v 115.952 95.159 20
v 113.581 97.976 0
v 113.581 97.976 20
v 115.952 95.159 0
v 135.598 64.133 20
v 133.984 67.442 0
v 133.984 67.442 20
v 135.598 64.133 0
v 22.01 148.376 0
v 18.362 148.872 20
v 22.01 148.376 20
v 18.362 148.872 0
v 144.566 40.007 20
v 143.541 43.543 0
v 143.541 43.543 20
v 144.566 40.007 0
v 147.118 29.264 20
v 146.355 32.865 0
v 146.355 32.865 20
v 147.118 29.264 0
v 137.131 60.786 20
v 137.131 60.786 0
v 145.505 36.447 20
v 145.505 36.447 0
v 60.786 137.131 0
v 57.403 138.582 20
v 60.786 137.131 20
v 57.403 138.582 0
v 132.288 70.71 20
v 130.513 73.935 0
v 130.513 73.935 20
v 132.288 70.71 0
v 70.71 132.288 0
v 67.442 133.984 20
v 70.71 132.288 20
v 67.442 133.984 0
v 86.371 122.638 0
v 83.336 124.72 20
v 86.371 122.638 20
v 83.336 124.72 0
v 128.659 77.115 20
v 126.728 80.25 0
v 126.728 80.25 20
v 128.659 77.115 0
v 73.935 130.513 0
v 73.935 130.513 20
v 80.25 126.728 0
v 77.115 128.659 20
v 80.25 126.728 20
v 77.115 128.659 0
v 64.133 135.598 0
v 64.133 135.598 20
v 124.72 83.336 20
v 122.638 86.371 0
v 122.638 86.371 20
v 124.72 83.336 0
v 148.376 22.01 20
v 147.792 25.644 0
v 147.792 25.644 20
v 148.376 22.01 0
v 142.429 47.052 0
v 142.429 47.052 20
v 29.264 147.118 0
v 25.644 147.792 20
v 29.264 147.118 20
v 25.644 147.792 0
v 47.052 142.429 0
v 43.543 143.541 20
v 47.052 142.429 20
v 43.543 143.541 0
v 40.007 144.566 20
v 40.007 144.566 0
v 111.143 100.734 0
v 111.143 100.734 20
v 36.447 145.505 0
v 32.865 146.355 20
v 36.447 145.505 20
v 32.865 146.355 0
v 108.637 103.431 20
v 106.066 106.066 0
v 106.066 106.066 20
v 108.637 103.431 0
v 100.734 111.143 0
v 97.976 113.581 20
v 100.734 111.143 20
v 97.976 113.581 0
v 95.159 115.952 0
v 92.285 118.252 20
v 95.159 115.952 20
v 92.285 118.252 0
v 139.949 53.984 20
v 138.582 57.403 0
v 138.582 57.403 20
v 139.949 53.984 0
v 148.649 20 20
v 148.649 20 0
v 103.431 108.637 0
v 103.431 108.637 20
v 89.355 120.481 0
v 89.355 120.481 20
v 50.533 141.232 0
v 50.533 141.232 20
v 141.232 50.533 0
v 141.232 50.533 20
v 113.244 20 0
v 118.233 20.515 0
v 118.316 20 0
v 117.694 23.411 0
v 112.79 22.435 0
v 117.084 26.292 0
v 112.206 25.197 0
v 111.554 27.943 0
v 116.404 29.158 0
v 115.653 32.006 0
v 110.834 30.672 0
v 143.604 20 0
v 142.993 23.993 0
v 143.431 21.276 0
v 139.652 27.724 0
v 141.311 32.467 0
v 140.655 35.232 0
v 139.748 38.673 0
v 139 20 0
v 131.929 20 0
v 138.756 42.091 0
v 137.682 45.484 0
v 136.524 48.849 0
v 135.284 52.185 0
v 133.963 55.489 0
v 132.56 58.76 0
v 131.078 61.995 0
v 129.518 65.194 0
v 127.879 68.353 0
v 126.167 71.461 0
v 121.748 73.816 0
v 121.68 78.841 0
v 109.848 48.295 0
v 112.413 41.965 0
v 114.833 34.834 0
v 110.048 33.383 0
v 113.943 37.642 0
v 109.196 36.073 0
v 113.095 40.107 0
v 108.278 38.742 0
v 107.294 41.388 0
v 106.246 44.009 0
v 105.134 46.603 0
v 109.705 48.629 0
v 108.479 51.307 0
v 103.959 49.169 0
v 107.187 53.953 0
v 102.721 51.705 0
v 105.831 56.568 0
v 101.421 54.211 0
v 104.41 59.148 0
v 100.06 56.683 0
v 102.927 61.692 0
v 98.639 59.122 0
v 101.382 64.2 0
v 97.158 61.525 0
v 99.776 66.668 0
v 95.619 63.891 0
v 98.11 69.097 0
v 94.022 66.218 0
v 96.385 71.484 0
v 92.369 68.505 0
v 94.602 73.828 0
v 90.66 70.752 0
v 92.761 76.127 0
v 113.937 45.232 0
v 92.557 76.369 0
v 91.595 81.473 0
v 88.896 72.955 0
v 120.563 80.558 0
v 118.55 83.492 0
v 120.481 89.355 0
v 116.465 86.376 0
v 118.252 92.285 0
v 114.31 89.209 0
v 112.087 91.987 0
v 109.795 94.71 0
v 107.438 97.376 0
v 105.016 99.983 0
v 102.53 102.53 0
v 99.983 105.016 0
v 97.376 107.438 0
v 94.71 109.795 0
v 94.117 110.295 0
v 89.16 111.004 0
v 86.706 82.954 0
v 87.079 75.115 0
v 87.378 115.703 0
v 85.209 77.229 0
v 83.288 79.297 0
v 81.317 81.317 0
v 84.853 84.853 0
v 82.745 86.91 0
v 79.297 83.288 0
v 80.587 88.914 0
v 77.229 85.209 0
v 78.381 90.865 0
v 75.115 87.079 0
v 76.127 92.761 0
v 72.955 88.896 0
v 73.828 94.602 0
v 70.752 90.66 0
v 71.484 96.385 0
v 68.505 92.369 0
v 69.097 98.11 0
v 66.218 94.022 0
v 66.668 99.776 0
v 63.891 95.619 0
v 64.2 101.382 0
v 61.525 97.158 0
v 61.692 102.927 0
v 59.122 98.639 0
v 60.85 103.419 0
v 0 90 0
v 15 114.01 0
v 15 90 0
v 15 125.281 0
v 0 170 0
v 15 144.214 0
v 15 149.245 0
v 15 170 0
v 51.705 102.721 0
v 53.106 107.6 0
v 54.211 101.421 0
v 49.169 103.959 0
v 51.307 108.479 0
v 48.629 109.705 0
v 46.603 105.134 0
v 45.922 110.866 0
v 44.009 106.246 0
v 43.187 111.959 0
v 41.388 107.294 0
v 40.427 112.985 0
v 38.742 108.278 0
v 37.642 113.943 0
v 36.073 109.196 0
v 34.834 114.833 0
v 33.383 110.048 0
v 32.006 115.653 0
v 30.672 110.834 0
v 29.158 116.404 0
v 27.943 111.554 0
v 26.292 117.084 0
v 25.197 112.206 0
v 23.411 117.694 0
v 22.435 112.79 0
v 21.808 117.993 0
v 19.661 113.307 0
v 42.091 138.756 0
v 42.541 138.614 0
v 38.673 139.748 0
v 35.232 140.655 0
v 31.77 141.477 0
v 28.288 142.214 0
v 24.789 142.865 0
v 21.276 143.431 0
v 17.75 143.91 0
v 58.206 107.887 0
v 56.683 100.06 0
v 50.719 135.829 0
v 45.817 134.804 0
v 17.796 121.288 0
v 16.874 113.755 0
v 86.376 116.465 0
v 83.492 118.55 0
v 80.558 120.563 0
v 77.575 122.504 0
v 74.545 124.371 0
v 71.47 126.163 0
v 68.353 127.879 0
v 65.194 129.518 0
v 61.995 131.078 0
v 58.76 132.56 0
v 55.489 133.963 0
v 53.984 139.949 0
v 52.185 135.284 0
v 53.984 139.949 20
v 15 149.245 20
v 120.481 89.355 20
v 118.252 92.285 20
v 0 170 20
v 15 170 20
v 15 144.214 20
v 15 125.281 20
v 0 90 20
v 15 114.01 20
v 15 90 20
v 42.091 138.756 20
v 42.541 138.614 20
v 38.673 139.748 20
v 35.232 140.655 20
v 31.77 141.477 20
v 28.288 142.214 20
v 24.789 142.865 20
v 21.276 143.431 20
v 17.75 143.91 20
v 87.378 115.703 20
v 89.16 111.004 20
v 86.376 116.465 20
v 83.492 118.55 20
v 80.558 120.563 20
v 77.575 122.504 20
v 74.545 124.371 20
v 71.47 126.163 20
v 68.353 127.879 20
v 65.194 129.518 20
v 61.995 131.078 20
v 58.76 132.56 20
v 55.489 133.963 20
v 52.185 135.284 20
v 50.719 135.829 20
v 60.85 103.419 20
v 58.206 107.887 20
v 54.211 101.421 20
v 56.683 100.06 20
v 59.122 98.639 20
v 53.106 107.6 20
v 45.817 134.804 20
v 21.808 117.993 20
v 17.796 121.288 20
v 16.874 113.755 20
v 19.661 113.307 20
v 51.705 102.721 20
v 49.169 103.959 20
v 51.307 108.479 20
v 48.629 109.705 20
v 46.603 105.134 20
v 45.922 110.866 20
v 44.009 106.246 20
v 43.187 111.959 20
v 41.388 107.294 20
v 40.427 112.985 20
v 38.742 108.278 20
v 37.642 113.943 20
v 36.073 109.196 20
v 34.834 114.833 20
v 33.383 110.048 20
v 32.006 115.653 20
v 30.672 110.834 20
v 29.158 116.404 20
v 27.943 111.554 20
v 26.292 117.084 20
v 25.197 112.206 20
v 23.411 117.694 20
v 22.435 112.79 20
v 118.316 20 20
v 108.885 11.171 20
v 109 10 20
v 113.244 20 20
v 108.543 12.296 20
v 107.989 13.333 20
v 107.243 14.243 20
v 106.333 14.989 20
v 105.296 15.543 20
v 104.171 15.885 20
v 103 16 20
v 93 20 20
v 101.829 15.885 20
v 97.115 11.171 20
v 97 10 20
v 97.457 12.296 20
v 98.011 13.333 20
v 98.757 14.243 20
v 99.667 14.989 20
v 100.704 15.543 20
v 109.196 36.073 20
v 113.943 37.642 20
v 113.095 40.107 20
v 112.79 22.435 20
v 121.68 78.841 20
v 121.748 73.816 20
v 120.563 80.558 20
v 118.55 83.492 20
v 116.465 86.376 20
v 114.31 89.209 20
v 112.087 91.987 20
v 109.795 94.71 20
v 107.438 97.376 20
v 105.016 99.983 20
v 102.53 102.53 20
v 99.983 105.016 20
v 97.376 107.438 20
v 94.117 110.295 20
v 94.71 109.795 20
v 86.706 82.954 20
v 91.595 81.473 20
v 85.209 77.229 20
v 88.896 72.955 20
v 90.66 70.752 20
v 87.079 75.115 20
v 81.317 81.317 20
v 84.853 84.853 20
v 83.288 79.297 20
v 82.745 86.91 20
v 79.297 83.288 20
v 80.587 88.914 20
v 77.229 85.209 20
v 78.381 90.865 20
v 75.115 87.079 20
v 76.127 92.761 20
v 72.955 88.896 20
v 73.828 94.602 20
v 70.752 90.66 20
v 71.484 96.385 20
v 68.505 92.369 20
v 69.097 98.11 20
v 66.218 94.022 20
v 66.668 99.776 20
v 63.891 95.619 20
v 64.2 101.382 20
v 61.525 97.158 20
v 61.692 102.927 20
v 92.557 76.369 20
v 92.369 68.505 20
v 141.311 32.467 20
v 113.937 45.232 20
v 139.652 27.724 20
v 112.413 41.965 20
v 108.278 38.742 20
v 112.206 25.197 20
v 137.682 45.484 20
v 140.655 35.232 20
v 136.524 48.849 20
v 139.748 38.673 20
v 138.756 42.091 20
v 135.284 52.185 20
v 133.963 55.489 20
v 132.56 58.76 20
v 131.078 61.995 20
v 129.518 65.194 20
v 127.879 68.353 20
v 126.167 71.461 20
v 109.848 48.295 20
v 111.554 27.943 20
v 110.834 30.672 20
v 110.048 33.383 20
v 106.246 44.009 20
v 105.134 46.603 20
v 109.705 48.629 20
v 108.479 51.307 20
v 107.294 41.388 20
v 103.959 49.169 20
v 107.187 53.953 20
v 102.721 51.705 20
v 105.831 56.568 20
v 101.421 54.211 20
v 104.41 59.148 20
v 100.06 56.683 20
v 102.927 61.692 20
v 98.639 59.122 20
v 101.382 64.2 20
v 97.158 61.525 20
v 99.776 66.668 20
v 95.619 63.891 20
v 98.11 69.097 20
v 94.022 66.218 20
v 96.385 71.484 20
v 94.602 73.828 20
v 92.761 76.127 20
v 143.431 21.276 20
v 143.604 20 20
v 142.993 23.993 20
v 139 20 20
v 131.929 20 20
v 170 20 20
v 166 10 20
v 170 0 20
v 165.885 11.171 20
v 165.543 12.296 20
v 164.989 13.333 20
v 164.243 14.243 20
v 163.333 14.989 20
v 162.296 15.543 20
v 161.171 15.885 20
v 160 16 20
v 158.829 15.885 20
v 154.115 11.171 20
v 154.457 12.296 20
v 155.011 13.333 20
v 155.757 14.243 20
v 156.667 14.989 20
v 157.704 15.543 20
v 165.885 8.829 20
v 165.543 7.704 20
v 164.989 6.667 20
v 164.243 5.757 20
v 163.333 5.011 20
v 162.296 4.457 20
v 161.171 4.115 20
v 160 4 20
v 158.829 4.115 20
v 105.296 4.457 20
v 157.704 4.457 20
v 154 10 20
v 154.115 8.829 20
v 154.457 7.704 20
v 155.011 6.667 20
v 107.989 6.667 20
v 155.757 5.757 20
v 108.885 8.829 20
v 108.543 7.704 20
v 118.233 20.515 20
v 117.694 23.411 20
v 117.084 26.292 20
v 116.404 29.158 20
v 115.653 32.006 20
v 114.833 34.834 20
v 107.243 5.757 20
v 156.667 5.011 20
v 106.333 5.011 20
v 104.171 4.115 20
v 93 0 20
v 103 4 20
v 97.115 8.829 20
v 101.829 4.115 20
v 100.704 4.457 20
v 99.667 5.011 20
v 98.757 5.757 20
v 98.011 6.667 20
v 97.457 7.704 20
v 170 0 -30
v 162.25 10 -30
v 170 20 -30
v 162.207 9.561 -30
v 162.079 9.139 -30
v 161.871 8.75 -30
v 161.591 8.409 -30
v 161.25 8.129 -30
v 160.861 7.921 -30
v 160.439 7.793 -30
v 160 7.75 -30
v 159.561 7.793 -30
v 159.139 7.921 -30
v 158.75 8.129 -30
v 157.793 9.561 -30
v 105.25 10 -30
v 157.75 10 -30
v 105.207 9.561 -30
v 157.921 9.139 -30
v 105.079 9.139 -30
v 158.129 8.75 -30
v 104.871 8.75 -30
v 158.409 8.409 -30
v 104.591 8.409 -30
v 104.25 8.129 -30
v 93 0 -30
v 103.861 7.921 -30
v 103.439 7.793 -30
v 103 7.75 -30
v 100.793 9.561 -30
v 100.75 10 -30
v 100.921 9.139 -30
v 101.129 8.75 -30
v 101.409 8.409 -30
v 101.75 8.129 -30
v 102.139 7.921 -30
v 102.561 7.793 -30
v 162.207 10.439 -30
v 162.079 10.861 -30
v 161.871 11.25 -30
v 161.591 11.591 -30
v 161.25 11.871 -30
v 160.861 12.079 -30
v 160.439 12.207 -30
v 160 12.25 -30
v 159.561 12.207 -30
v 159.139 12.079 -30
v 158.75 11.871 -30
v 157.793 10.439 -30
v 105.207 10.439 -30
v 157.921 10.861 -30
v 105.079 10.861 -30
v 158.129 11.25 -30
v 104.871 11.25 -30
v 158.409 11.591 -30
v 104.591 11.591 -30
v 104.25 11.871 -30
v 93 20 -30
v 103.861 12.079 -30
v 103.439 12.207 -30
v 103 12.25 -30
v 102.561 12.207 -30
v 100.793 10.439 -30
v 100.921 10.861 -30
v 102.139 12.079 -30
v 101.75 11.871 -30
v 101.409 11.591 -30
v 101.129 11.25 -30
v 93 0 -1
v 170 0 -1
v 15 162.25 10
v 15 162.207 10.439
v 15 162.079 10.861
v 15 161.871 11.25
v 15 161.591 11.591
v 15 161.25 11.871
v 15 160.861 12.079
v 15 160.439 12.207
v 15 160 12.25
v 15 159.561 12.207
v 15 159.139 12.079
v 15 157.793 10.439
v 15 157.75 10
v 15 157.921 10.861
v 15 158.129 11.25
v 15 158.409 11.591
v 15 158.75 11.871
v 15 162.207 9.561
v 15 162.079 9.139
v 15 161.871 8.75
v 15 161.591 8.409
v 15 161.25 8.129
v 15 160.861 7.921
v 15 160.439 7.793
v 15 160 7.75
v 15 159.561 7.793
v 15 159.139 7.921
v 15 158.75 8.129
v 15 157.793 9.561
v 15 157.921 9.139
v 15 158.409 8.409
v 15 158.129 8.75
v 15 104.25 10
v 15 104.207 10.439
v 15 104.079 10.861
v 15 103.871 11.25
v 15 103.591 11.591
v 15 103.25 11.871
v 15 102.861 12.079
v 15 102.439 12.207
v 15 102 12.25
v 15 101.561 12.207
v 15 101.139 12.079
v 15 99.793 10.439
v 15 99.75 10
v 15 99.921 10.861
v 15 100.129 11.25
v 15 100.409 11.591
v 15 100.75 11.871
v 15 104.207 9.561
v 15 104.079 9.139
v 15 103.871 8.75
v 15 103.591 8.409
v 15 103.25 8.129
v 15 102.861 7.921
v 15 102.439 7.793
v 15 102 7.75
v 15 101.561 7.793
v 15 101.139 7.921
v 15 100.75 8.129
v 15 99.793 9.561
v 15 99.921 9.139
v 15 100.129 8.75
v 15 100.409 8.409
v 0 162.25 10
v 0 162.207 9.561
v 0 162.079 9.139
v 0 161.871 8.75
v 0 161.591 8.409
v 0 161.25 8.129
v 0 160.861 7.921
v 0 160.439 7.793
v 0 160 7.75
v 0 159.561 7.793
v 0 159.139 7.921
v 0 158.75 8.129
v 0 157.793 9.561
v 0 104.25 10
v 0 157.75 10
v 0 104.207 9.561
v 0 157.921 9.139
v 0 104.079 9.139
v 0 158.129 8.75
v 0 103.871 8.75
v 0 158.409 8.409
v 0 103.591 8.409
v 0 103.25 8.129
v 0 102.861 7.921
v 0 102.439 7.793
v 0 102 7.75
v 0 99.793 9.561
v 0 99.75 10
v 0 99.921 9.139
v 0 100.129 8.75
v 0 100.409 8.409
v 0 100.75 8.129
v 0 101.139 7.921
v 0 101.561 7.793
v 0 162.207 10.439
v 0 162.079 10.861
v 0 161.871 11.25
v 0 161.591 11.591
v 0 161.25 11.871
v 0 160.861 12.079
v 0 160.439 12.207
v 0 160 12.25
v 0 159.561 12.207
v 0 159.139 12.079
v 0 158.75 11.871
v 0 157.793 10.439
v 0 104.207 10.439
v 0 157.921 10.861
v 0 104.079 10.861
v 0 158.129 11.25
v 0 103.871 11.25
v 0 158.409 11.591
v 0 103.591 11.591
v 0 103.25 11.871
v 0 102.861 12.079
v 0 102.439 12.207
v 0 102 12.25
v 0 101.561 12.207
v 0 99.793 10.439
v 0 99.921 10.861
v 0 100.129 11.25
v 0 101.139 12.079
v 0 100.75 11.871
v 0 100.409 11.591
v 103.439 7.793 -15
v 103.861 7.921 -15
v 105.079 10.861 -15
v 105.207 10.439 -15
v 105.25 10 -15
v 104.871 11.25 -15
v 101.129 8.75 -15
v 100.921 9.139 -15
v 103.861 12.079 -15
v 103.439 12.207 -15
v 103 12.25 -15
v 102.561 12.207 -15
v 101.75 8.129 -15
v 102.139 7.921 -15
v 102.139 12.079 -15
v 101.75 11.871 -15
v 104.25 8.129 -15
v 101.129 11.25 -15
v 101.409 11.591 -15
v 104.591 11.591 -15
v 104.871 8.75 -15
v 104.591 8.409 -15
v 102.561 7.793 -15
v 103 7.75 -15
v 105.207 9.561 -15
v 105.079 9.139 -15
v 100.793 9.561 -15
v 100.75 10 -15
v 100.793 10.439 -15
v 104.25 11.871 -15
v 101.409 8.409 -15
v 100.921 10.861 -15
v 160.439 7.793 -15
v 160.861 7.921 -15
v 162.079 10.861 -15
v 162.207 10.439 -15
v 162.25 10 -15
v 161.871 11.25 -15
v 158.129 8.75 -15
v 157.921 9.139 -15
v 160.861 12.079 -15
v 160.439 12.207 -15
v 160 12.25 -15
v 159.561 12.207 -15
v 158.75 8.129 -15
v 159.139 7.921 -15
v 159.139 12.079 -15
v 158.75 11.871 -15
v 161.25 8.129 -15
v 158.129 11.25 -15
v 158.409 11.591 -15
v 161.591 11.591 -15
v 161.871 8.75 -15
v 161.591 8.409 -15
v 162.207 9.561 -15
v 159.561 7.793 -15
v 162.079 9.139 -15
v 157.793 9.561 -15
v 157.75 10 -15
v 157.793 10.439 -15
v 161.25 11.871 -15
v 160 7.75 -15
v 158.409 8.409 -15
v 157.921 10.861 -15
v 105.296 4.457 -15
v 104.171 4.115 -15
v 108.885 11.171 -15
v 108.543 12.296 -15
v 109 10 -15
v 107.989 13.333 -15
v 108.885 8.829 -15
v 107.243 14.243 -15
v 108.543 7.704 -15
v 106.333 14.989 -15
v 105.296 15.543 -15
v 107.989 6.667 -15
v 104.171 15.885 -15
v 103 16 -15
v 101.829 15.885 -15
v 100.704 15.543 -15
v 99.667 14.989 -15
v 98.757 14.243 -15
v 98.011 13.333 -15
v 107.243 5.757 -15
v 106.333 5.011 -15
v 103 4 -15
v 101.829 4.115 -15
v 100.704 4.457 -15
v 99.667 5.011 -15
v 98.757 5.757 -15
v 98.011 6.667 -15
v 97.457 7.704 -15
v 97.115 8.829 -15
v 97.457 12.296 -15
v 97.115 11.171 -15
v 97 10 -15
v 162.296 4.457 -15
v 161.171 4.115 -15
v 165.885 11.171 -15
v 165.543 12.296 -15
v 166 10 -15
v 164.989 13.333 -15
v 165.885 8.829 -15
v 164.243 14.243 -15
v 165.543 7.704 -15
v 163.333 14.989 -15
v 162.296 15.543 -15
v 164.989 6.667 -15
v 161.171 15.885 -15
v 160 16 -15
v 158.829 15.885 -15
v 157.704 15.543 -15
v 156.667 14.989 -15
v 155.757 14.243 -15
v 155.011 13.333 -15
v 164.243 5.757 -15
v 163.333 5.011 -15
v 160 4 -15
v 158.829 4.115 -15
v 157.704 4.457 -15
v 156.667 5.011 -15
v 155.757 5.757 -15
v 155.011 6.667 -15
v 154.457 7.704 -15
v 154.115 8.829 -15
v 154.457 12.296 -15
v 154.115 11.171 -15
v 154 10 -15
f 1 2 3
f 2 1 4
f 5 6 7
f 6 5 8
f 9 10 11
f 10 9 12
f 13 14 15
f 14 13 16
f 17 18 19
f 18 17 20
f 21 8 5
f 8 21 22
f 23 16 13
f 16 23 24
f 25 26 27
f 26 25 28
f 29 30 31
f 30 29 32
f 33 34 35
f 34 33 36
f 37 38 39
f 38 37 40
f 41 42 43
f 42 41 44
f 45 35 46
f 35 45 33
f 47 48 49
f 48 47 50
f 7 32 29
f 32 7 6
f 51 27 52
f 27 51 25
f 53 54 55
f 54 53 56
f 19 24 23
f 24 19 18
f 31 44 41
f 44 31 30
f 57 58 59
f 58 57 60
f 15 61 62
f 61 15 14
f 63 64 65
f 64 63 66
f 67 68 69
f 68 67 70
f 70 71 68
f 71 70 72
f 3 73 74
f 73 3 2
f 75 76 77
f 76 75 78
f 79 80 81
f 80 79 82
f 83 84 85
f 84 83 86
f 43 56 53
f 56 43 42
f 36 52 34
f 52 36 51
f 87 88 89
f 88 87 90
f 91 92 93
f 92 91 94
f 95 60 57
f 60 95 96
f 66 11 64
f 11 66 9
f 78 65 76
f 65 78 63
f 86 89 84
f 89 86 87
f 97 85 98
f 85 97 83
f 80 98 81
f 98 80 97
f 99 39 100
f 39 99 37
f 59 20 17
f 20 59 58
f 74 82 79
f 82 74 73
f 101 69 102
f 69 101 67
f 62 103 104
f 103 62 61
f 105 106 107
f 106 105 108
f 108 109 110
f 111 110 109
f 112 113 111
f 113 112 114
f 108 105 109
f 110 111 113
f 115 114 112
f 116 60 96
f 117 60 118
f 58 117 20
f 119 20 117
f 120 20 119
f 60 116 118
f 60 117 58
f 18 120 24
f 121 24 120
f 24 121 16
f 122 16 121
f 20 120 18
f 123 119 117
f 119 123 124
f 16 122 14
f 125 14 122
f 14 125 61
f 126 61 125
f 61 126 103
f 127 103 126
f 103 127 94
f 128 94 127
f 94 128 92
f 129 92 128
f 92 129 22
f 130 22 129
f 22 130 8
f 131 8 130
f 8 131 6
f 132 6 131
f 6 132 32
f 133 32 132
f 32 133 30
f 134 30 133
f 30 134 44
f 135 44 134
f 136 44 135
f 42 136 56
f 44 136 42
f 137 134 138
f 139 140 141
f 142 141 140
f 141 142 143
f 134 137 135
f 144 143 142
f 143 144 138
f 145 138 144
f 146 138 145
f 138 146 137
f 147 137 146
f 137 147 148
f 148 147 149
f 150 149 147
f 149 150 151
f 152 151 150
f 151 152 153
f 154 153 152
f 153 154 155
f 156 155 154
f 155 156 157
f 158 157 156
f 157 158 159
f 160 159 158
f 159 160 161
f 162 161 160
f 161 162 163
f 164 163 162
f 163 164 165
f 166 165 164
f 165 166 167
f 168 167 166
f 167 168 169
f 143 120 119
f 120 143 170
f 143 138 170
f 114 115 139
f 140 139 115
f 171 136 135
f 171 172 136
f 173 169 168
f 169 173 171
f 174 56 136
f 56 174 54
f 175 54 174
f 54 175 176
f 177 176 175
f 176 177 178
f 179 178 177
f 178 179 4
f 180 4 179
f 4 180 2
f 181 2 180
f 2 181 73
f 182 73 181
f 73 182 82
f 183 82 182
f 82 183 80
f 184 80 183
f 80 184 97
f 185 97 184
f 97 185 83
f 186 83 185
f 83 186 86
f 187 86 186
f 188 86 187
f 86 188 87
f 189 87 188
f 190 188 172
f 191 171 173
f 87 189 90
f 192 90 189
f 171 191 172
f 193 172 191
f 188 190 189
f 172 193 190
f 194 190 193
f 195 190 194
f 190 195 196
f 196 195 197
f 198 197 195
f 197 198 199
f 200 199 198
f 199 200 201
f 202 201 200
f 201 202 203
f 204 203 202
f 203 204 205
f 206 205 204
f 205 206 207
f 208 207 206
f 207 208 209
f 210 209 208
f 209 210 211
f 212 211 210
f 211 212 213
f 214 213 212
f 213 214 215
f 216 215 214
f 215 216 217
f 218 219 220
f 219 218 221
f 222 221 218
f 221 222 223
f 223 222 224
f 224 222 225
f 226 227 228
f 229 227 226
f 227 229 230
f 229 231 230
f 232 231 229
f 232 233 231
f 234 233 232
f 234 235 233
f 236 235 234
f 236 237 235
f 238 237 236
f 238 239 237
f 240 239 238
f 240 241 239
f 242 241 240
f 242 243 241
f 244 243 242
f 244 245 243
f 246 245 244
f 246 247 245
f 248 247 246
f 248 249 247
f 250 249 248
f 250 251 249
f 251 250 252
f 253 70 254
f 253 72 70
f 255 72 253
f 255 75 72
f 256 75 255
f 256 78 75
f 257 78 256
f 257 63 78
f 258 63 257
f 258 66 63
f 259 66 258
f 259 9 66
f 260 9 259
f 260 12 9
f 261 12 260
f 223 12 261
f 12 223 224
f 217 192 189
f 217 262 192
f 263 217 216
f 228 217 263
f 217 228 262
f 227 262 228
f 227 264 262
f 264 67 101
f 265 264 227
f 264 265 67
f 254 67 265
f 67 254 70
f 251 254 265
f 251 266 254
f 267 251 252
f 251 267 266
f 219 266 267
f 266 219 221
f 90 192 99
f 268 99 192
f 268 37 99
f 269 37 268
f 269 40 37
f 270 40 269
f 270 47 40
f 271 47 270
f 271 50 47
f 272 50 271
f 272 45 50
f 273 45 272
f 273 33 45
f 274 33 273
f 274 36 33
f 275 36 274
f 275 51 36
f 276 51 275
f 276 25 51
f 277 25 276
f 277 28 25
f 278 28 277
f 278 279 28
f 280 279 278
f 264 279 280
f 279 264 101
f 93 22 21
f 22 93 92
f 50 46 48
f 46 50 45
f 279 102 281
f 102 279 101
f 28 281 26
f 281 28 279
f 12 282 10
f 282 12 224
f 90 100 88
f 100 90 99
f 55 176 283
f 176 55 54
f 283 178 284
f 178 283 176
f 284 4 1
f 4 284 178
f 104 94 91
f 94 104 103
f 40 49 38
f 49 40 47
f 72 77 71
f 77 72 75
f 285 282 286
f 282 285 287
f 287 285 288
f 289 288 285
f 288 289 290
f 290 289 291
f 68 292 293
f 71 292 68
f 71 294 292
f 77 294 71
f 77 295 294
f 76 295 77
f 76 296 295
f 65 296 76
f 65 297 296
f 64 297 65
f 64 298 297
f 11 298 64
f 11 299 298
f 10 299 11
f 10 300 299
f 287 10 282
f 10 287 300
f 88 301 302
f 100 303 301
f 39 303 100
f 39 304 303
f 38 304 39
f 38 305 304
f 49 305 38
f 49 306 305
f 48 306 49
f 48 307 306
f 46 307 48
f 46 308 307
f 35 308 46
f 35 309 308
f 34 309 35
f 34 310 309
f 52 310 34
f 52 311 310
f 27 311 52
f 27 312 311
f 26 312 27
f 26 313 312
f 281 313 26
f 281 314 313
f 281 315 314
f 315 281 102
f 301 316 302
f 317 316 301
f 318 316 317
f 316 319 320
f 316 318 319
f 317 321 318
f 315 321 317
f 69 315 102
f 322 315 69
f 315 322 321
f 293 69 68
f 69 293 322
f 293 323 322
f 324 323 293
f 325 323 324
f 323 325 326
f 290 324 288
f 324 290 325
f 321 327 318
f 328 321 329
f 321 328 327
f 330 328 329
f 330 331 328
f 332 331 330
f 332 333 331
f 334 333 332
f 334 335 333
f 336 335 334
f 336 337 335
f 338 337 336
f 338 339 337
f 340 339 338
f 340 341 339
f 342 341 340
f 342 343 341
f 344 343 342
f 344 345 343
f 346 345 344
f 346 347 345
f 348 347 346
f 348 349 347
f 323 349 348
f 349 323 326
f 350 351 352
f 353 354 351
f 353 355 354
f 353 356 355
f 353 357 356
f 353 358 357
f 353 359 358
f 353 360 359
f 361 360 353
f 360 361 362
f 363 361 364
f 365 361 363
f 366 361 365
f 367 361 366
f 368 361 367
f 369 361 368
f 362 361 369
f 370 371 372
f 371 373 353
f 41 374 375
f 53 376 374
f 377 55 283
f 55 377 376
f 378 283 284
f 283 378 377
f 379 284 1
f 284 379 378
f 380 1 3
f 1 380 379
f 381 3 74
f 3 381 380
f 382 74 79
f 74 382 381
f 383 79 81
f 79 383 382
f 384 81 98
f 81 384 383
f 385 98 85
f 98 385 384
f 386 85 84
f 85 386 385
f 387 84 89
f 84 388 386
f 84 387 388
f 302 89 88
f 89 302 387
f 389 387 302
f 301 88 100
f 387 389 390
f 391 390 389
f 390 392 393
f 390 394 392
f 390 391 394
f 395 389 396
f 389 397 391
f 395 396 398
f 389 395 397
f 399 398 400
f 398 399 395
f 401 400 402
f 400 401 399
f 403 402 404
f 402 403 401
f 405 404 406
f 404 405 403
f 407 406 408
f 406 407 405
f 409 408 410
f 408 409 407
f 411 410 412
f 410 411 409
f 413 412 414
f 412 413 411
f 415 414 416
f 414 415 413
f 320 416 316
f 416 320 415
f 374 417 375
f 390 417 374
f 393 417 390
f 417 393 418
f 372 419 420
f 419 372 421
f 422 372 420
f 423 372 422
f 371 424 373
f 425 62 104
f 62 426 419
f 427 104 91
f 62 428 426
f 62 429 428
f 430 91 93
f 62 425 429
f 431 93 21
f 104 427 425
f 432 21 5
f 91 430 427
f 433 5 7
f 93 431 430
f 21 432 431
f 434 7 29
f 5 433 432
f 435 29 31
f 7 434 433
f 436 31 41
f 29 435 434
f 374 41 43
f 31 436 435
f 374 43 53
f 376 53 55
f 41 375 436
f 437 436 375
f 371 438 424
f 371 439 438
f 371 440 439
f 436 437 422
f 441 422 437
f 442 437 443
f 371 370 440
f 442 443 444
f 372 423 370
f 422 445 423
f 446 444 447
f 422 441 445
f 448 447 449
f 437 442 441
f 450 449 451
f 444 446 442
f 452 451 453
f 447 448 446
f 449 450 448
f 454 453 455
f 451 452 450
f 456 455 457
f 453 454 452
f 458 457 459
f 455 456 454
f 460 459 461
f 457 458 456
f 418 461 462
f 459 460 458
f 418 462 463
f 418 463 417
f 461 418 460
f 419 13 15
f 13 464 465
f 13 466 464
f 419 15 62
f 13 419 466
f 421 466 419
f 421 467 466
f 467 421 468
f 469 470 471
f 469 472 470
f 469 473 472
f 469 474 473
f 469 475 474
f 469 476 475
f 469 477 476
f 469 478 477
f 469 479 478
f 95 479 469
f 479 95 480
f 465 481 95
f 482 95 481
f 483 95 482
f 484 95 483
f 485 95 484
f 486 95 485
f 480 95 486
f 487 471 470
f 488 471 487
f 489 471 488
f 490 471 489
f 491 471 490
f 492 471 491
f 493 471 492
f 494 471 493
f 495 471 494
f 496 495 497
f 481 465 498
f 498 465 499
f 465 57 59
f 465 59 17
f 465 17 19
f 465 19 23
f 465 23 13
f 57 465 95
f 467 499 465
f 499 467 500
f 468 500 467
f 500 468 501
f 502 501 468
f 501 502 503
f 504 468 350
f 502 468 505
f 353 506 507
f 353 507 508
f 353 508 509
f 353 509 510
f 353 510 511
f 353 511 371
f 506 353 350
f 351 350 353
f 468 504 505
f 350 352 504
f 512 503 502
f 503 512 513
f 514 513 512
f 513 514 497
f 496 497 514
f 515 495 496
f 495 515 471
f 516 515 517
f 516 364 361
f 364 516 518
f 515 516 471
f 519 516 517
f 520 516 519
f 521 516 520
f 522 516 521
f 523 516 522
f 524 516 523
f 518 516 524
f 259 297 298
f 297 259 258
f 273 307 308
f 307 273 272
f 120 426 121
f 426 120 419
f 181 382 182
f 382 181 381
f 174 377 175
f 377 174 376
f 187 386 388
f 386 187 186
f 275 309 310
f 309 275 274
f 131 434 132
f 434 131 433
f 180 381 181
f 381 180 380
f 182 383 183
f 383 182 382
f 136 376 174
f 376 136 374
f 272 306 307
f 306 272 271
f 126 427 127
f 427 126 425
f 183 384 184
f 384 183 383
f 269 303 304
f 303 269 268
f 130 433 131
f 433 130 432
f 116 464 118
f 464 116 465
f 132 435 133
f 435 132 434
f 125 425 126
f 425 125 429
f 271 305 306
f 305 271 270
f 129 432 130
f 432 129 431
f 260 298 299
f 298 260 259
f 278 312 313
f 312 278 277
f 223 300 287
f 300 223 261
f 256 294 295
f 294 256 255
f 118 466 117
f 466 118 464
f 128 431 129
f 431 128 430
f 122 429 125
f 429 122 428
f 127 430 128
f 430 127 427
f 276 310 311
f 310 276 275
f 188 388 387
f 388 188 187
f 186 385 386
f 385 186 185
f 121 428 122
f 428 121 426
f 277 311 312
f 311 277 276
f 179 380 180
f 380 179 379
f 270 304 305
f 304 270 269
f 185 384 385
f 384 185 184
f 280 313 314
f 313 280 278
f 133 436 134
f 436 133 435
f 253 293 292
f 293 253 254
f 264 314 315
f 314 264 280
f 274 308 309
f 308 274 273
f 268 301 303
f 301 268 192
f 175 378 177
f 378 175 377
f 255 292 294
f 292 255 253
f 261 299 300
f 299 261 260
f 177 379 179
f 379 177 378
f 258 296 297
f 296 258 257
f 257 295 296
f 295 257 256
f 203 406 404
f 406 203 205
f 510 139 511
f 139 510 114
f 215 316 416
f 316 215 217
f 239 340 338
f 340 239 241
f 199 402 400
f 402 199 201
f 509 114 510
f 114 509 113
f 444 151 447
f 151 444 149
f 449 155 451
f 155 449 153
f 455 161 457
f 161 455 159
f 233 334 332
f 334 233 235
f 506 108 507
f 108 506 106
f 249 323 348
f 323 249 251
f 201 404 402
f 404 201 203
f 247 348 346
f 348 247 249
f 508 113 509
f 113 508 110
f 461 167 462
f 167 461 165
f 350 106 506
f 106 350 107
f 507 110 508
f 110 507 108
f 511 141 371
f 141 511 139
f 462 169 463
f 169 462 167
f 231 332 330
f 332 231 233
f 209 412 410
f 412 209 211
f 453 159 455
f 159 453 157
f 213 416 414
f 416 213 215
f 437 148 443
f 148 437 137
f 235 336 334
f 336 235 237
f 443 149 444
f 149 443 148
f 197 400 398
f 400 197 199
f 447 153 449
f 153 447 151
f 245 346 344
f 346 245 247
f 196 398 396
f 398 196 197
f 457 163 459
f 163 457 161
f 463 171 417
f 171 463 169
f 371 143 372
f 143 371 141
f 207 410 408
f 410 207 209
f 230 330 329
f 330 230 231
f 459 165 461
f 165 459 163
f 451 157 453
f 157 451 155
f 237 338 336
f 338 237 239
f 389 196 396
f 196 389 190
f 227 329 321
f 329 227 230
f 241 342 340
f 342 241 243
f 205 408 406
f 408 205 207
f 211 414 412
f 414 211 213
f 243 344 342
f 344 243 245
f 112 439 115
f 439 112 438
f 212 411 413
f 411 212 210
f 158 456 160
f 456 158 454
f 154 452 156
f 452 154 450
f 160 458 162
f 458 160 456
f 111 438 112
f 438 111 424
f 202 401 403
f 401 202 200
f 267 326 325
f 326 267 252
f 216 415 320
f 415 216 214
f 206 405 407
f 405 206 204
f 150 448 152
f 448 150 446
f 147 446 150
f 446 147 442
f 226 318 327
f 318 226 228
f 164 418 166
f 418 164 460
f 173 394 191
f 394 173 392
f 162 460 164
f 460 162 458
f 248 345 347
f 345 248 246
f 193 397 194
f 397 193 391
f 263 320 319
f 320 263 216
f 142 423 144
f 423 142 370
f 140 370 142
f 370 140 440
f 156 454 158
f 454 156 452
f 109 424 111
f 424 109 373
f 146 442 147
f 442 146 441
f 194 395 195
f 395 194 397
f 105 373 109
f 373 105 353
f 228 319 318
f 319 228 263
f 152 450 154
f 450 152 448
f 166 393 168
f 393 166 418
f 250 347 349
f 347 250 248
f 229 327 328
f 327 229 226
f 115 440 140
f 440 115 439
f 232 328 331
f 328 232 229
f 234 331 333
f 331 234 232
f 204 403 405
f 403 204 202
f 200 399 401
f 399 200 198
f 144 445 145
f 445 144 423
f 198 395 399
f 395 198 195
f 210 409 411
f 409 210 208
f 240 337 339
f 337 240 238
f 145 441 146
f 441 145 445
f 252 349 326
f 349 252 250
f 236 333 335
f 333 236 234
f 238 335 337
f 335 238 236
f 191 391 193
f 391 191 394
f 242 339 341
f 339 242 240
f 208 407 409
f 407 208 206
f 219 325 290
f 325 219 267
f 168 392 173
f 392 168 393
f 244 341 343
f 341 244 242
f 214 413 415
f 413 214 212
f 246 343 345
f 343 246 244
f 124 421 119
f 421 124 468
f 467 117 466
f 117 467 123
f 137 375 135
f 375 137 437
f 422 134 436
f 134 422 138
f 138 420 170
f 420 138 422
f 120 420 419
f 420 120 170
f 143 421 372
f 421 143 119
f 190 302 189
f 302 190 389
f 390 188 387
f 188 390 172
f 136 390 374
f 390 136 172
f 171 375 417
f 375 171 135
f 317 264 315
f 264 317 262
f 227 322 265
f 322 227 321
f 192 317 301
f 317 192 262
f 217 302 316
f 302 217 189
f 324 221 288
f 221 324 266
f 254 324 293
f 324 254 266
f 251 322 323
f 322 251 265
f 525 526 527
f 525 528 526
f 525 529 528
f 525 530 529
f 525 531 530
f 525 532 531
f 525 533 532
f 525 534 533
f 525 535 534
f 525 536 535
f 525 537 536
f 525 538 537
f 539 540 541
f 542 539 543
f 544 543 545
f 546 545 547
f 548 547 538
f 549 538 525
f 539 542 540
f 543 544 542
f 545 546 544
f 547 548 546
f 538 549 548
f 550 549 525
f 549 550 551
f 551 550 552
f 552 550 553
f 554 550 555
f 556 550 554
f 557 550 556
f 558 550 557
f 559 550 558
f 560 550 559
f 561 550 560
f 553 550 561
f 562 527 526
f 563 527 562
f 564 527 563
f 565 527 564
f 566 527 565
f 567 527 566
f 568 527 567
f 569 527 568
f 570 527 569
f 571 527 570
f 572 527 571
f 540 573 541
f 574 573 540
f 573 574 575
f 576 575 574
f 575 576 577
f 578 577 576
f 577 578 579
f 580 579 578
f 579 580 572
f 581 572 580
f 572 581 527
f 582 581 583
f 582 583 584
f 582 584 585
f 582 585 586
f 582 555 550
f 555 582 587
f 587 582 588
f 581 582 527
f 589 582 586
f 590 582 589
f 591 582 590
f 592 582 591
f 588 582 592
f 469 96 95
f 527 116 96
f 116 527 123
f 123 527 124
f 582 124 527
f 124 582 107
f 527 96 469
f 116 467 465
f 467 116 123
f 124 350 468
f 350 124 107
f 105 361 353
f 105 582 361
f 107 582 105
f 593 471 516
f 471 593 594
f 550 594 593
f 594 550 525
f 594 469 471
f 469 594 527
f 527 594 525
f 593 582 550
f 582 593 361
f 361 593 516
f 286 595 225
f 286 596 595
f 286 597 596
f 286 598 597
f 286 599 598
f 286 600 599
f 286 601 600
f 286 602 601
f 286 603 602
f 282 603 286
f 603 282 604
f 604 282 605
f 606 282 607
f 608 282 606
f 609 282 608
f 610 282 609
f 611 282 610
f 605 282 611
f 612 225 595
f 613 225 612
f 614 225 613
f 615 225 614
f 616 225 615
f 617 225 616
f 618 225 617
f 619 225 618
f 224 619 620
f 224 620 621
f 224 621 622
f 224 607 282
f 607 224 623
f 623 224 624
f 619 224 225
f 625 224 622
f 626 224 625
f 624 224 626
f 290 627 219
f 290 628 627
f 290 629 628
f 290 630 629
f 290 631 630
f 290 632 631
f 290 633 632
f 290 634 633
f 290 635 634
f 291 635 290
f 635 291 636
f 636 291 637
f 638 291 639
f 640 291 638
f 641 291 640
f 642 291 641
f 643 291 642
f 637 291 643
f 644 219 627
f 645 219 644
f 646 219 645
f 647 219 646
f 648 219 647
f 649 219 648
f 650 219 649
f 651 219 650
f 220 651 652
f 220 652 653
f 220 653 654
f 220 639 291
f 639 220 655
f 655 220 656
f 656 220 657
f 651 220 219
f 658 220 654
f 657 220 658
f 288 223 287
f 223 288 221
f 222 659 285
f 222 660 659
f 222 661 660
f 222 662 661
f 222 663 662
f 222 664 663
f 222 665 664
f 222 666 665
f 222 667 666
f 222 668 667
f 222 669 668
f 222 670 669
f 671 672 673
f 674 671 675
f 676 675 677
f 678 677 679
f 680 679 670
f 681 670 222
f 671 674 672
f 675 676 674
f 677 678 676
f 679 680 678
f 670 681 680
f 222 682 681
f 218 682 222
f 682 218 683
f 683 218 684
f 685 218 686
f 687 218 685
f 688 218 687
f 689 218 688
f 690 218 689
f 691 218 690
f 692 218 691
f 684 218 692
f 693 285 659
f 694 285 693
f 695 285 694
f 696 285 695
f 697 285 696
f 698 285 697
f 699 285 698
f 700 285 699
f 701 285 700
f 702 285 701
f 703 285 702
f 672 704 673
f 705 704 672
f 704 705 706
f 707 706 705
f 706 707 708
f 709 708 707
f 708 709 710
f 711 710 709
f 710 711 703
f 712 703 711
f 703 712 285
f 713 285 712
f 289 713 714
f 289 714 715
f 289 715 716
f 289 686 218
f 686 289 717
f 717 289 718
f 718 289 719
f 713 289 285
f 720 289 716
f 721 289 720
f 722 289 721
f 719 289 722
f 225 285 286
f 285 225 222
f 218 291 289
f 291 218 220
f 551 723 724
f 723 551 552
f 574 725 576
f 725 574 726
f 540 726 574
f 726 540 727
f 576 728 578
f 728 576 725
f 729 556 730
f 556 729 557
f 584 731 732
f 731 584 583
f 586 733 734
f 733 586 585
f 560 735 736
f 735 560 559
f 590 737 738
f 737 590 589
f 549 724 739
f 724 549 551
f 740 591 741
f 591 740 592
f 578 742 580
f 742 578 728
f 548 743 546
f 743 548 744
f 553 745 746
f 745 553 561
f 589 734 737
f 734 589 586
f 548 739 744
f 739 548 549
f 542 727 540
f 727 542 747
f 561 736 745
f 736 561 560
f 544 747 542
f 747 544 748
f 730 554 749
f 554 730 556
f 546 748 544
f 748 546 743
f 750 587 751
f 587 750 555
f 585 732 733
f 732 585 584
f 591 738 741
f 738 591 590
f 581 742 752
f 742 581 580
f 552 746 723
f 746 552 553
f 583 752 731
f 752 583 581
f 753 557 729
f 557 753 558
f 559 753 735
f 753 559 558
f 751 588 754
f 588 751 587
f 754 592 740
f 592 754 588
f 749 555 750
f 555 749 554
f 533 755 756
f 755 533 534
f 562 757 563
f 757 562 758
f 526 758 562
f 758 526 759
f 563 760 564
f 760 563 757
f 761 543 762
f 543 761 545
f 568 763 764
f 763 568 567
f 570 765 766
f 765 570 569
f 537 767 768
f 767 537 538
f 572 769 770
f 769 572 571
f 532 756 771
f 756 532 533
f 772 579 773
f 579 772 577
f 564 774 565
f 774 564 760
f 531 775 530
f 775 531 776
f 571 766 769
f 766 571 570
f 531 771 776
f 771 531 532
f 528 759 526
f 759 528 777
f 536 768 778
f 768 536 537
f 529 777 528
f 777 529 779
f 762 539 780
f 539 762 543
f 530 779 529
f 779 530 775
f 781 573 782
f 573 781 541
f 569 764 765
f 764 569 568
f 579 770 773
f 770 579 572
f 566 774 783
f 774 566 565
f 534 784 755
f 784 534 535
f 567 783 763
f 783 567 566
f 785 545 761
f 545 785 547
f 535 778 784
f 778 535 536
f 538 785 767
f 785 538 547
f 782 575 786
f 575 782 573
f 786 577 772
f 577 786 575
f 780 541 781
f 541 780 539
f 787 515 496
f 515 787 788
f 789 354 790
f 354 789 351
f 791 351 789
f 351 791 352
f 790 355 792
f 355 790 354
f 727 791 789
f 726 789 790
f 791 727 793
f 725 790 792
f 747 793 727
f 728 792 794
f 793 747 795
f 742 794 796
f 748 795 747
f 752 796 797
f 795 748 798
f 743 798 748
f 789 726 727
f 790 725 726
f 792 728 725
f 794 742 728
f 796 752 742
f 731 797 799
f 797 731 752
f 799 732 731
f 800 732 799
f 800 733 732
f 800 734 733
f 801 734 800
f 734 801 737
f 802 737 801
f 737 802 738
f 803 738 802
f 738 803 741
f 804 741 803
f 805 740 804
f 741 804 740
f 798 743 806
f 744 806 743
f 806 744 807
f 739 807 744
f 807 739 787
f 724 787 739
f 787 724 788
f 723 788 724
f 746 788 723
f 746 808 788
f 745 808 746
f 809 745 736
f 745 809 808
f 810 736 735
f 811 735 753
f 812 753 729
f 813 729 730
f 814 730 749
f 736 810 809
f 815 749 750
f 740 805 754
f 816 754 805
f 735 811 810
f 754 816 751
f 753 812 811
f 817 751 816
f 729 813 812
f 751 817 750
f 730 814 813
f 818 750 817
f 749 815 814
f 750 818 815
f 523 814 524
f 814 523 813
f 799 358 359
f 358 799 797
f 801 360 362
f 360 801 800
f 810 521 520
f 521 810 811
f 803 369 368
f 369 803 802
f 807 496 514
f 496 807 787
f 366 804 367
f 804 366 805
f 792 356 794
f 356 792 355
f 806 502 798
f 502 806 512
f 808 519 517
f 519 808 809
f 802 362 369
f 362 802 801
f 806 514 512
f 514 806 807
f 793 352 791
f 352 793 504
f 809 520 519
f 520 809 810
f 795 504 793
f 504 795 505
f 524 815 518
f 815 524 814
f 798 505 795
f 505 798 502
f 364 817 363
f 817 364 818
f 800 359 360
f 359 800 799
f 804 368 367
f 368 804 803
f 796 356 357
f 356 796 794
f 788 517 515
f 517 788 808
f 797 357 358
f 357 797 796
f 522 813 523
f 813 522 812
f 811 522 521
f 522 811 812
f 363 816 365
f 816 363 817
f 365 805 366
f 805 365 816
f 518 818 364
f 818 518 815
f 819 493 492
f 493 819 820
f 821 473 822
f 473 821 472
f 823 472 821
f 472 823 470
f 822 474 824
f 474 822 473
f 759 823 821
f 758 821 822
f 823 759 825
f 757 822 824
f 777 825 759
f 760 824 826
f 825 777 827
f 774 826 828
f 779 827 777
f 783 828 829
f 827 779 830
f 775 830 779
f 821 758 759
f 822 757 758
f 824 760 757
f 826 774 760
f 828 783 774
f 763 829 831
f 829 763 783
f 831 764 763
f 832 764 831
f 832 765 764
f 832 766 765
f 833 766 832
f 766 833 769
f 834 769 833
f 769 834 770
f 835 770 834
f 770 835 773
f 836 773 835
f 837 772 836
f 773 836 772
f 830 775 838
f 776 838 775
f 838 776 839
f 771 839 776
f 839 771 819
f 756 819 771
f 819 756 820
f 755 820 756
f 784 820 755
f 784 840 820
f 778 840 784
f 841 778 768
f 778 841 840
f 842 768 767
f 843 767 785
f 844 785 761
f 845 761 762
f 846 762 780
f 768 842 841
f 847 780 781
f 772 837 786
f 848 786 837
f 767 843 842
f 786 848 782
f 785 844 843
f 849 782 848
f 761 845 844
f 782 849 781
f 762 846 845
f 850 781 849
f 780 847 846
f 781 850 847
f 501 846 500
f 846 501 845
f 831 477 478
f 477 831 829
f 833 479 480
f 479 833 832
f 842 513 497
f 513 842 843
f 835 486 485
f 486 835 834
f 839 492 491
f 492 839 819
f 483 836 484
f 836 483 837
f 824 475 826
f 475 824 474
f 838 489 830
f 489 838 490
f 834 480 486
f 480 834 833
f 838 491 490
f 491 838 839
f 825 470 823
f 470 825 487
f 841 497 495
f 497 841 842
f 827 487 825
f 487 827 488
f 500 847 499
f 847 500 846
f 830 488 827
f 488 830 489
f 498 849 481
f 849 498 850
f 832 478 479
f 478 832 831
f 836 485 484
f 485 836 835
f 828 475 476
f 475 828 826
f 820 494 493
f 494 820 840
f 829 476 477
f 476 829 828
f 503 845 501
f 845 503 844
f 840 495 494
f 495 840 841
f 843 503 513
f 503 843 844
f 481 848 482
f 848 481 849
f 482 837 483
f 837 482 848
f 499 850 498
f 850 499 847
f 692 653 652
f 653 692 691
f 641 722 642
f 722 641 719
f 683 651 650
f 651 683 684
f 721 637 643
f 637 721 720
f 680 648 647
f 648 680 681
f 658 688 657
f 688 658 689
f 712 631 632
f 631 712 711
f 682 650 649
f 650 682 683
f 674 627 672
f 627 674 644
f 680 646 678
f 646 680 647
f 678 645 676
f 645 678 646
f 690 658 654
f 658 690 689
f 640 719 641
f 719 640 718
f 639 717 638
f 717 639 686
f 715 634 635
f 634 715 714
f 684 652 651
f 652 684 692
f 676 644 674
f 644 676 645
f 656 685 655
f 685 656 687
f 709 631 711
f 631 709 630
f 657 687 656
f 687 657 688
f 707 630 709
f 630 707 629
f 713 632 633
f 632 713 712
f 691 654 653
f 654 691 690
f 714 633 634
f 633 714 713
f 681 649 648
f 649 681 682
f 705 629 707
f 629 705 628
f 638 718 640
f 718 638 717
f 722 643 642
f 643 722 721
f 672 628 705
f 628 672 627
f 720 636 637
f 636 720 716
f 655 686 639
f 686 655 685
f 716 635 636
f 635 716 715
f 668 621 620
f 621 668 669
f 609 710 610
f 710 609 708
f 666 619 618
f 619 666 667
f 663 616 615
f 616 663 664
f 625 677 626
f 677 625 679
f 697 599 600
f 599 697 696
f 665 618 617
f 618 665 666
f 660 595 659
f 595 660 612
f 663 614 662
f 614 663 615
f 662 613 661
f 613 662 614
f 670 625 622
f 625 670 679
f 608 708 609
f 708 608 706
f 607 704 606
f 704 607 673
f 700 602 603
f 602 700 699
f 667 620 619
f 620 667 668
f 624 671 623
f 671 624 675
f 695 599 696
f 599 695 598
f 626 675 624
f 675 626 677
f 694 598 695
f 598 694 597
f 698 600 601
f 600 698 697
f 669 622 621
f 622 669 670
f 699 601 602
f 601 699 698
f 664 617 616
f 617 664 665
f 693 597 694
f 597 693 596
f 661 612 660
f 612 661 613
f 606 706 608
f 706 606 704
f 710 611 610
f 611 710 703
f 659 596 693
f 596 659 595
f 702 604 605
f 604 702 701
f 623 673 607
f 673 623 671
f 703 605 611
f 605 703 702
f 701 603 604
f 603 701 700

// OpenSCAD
module Bracket90degreesSupport_backRight() {
    difference() {
        union() {
            difference() {
                cylinder(r=150, h=20, $fn=256);
                translate([0, 0, -1]) cylinder(r=145, h=22, $fn=256);
            }
            difference() {
                cylinder(r=120, h=20, $fn=256);
                translate([0, 0, -1]) cylinder(r=115, h=22, $fn=256);
            }
            for(i=[0:17]) {
                rotate([0, 0, i*20]) translate([119, 0, 0]) rotate([0, 0, 45]) cube([36, 5, 20]);
                rotate([0, 0, i*20]) translate([119, 0, 0]) rotate([0, 0, -45]) cube([36, 5, 20]);
            }
            translate([113, 0, -30]) cube([37, 20, 50]);
            translate([93, 0, -30]) cube([77, 20, 50]);
            translate([0, 90, 0]) cube([15, 80, 20]);
        }
        translate([-200, -200, -1]) cube([200, 400, 22]);
        translate([-1, -200, -1]) cube([200, 200, 22]);
        translate([103, 10, -32]) cylinder(d=4.5, h=50, $fn=32);
        translate([160, 10, -32]) cylinder(d=4.5, h=50, $fn=32);
        translate([103, 10, -15]) cylinder(d=12, h=50, $fn=32);
        translate([160, 10, -15]) cylinder(d=12, h=50, $fn=32);
        translate([-1, 102, 10]) rotate([0, 90, 0]) cylinder(d=4.5, h=30, $fn=32);
        translate([-1, 160, 10]) rotate([0, 90, 0]) cylinder(d=4.5, h=30, $fn=32);
    }
}

module Bracket90degreesSupport_frontRight() {
    difference() {
        union() {
            difference() {
                cylinder(r=150, h=20, $fn=256);
                translate([0, 0, -1]) cylinder(r=145, h=22, $fn=256);
            }
            difference() {
                cylinder(r=120, h=20, $fn=256);
                translate([0, 0, -1]) cylinder(r=115, h=22, $fn=256);
            }
            for(i=[0:17]) {
                rotate([0, 0, i*20]) translate([119, 0, 0]) rotate([0, 0, 45]) cube([36, 5, 20]);
                rotate([0, 0, i*20]) translate([119, 0, 0]) rotate([0, 0, -45]) cube([36, 5, 20]);
            }
            translate([93, 0, 0]) cube([77, 20, 29.5]);
            translate([0, 90, 0]) cube([15, 80, 20]);
        }
        translate([-200, -200, -1]) cube([200, 400, 22]);
        translate([-1, -200, -1]) cube([200, 200, 22]);
        translate([103, 10, -1]) cylinder(d=4.5, h=50, $fn=32);
        translate([160, 10, -1]) cylinder(d=4.5, h=50, $fn=32);
        translate([103, 10, -0.5]) cylinder(d=12, h=15, $fn=32);
        translate([160, 10, -0.5]) cylinder(d=12, h=15, $fn=32);
        translate([-1, 102, 10]) rotate([0, 90, 0]) cylinder(d=4.5, h=30, $fn=32);
        translate([-1, 160, 10]) rotate([0, 90, 0]) cylinder(d=4.5, h=30, $fn=32);
    }
}

Bracket90degreesSupport_backRight();
